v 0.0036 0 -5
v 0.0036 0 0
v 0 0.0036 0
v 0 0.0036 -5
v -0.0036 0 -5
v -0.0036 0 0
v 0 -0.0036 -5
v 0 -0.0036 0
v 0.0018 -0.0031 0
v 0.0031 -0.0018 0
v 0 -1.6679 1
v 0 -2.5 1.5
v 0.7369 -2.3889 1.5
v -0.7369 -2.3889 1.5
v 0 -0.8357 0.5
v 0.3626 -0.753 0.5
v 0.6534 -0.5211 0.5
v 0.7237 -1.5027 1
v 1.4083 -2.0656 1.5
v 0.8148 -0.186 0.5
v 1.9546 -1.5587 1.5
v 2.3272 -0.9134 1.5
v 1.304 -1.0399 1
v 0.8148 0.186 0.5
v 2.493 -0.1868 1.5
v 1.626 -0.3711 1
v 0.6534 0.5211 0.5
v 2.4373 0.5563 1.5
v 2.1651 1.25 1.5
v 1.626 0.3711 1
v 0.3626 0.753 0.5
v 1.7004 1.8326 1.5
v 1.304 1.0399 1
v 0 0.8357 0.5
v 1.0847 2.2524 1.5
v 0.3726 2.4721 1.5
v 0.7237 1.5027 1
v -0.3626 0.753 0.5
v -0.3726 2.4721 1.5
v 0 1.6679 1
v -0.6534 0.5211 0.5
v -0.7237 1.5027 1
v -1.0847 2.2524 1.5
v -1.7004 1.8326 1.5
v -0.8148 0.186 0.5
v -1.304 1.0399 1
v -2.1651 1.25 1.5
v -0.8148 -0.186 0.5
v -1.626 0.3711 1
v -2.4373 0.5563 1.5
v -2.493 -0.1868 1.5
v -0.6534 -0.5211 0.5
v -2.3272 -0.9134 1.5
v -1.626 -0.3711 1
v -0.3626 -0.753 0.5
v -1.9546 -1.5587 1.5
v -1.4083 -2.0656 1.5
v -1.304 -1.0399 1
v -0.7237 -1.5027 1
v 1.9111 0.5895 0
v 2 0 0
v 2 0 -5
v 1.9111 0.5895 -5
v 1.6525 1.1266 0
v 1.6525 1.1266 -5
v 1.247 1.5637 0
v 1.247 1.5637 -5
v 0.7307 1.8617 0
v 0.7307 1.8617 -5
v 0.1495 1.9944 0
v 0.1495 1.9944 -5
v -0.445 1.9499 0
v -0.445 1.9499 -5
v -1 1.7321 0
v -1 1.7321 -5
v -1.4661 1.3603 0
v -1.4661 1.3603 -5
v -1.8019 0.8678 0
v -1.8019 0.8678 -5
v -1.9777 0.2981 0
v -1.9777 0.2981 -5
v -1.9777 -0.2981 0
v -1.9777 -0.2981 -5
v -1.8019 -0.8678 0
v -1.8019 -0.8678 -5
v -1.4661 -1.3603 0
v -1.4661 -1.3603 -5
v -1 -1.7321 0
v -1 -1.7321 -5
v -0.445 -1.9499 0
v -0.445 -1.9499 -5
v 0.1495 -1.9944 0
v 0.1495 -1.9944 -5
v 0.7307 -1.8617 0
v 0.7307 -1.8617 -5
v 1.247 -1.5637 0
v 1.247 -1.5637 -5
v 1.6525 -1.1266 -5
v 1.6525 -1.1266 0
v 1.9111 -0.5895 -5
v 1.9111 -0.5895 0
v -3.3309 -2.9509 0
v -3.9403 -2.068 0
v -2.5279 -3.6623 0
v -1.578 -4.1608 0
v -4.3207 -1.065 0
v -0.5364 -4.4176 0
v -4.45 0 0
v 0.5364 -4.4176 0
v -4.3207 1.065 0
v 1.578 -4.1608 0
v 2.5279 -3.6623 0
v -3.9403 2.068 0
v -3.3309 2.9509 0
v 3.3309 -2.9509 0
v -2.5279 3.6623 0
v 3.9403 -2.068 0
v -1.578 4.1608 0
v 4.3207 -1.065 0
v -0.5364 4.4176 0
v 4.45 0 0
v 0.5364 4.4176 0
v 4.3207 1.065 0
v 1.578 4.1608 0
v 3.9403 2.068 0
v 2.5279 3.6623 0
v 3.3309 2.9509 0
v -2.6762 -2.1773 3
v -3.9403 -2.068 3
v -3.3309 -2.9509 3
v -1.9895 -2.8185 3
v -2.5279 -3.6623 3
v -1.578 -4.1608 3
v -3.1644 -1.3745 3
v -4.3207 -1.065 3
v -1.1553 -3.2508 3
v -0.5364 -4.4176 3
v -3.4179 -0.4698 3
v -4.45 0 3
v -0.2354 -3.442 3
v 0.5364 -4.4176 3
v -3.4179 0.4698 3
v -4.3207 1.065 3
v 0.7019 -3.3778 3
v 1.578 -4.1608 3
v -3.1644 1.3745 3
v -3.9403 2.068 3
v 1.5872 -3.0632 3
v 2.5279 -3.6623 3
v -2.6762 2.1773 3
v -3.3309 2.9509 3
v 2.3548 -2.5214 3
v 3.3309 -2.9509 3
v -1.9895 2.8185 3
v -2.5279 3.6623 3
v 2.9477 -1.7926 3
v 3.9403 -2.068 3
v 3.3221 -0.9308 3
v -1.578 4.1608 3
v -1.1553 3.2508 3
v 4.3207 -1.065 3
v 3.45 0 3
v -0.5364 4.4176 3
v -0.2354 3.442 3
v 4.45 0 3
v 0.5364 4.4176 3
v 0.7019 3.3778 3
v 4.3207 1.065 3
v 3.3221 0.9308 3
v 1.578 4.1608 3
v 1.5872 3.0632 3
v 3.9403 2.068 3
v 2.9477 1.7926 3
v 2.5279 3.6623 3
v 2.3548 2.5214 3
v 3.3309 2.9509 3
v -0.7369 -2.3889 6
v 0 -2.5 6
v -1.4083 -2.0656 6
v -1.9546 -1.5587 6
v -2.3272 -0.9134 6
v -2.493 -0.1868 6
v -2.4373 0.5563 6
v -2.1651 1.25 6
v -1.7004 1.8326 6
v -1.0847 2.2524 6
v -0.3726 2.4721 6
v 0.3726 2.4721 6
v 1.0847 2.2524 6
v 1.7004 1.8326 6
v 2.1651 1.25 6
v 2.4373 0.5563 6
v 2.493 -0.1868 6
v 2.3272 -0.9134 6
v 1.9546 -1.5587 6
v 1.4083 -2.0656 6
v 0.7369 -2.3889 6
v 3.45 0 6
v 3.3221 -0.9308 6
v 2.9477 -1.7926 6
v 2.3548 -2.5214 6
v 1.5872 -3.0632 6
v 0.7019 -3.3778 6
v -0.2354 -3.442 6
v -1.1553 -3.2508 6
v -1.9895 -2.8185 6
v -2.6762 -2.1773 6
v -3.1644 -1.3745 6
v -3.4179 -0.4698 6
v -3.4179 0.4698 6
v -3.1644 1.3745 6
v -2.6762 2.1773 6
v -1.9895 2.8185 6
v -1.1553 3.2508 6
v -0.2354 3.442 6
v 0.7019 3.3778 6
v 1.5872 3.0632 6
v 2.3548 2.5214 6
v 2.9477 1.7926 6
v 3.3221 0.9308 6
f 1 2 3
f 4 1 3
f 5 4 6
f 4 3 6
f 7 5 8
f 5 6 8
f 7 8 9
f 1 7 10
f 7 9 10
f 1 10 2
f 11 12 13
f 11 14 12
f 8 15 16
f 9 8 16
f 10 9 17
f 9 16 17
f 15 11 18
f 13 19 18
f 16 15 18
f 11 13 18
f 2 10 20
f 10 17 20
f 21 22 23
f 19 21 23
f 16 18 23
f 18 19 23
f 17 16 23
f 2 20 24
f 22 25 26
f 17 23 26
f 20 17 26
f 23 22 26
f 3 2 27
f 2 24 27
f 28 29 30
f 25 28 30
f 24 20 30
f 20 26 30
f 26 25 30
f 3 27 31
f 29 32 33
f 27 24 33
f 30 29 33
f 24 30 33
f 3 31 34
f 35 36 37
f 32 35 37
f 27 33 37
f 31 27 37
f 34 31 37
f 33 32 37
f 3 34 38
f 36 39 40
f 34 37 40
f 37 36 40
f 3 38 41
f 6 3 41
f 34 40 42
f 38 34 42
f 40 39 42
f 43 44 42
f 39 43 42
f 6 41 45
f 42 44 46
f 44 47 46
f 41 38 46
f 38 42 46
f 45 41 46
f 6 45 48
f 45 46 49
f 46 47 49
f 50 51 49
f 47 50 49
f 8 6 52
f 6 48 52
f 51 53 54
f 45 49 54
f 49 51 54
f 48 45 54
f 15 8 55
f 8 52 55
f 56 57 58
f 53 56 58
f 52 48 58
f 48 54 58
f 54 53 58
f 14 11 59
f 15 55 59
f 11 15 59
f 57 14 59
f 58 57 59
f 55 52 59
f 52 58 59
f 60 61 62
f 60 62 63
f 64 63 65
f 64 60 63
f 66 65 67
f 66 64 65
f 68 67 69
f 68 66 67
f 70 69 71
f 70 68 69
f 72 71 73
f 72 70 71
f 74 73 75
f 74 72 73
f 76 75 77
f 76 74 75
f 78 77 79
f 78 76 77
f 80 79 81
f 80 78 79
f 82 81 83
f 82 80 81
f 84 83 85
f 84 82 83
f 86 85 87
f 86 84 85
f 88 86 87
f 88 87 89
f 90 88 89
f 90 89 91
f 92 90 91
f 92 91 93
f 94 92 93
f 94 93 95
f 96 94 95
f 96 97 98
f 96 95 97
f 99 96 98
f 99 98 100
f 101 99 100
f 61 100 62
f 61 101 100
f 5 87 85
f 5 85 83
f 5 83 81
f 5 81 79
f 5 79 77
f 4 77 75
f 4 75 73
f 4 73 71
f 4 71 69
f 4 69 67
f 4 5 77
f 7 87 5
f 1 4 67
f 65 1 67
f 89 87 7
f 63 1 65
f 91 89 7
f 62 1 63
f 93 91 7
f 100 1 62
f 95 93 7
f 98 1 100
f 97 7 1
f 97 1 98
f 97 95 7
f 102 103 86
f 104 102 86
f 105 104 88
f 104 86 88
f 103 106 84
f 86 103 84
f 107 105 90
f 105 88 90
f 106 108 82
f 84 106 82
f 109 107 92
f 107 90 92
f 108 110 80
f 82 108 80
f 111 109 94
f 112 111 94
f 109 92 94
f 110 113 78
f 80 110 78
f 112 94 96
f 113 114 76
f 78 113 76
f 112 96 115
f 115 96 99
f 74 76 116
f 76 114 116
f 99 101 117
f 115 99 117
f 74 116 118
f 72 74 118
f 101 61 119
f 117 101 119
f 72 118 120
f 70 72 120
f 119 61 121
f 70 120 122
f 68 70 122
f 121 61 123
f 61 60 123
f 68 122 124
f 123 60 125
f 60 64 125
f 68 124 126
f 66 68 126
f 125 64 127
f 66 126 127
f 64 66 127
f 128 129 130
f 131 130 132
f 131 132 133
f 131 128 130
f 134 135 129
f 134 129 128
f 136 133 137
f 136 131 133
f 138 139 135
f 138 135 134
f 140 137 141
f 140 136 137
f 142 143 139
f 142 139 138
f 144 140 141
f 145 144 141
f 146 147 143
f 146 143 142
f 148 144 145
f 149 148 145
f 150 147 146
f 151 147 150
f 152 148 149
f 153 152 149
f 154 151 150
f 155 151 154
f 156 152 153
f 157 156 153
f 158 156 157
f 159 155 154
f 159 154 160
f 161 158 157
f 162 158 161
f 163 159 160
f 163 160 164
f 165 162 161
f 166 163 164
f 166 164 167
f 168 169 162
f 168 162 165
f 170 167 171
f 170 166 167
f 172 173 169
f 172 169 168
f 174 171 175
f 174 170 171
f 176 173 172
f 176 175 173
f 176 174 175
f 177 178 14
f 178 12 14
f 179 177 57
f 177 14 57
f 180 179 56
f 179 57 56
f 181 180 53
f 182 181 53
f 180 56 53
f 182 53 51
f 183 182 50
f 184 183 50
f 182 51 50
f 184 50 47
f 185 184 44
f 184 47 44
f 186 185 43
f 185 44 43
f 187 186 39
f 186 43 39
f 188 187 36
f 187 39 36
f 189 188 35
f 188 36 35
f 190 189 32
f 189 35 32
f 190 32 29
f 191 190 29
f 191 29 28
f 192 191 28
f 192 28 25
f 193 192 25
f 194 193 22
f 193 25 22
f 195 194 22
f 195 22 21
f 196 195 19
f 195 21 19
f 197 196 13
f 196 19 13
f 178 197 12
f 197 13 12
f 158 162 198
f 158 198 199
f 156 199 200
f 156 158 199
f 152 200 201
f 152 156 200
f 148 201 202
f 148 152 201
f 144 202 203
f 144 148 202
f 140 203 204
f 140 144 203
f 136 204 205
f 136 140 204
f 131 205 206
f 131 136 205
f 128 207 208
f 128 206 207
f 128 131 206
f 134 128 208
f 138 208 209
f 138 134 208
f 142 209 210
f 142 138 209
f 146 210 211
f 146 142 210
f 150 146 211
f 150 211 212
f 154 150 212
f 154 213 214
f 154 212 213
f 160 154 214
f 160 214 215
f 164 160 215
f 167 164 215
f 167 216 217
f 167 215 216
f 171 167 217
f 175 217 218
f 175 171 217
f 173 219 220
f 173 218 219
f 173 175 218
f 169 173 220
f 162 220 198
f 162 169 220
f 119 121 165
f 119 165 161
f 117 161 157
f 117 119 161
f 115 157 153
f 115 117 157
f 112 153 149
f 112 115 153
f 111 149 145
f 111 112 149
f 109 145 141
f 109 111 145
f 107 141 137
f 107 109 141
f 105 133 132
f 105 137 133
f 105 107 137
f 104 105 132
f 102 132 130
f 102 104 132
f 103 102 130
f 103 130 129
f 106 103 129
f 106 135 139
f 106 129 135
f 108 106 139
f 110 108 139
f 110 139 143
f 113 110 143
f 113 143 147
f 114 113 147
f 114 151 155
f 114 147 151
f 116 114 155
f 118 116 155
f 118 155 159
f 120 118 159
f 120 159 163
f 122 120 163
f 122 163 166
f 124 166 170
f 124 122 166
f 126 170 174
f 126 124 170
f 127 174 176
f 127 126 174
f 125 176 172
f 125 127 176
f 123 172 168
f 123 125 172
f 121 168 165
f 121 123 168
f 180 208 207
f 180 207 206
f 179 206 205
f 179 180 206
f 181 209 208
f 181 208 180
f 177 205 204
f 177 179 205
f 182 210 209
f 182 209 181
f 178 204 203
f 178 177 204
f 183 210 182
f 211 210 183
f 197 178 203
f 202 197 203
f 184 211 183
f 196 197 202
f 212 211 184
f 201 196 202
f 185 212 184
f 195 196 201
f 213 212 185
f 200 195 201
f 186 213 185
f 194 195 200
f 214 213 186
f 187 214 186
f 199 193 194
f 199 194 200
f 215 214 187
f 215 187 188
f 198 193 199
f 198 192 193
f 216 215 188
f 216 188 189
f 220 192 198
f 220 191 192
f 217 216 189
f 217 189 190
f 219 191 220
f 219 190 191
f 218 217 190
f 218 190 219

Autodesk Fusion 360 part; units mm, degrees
sketch "Sketch1" plane through (0, 0, 0) normal (0, 0, 1) x (1, 0, 0)
  circle A0 centre (0, 0) radius 3.45
  circle A1 centre (0, 0) radius 4.45
  dimension "d1" = 6.9
  dimension "d2" = 1
extrude "Extrude1" add sketch "Sketch1" along normal blind 3
extrude "Extrude2" add sketch "Sketch1" along normal blind 6 contours A0
sketch "Sketch2" plane through (0, 0, 6) normal (0, 0, 1) x (-1, 0, 0)
  circle A0 centre (0, 0) radius 3.45
  circle A1 centre (-2, 2) radius 0.5
  circle A2 centre (0, 2) radius 0.5
  circle A3 centre (2, 2) radius 0.5
  circle A4 centre (-2, 0) radius 0.5
  circle A5 centre (0, 0) radius 0.5
  circle A6 centre (2, 0) radius 0.5
  circle A7 centre (-2, -2) radius 0.5
  circle A8 centre (0, -2) radius 0.5
  circle A9 centre (2, -2) radius 0.5
  point P0 (-2, 2)
  dimension "d7" = 1
  dimension "d8" = 1
  dimension "d9" = 1
  dimension "d10" = 1
  dimension "d11" = 1
  dimension "d12" = 1
  dimension "d13" = 1
  dimension "d14" = 1
  dimension "d15" = 1
hole "Hole2" at (0, 0, 6) direction (0, 0, -1) diameter 5 depth 4.5 tip angle 118
sketch "Sketch3" plane through (0, 0, 0) normal (0, 0, -1) x (1, 0, 0)
  circle A0 centre (0, 0) radius 0.0036
  circle A1 centre (0, 0) radius 4.45
  circle A2 centre (0, 0) radius 2
  dimension "d22" = 4
extrude "Extrude3" add sketch "Sketch3" along normal blind 5 contours A2
